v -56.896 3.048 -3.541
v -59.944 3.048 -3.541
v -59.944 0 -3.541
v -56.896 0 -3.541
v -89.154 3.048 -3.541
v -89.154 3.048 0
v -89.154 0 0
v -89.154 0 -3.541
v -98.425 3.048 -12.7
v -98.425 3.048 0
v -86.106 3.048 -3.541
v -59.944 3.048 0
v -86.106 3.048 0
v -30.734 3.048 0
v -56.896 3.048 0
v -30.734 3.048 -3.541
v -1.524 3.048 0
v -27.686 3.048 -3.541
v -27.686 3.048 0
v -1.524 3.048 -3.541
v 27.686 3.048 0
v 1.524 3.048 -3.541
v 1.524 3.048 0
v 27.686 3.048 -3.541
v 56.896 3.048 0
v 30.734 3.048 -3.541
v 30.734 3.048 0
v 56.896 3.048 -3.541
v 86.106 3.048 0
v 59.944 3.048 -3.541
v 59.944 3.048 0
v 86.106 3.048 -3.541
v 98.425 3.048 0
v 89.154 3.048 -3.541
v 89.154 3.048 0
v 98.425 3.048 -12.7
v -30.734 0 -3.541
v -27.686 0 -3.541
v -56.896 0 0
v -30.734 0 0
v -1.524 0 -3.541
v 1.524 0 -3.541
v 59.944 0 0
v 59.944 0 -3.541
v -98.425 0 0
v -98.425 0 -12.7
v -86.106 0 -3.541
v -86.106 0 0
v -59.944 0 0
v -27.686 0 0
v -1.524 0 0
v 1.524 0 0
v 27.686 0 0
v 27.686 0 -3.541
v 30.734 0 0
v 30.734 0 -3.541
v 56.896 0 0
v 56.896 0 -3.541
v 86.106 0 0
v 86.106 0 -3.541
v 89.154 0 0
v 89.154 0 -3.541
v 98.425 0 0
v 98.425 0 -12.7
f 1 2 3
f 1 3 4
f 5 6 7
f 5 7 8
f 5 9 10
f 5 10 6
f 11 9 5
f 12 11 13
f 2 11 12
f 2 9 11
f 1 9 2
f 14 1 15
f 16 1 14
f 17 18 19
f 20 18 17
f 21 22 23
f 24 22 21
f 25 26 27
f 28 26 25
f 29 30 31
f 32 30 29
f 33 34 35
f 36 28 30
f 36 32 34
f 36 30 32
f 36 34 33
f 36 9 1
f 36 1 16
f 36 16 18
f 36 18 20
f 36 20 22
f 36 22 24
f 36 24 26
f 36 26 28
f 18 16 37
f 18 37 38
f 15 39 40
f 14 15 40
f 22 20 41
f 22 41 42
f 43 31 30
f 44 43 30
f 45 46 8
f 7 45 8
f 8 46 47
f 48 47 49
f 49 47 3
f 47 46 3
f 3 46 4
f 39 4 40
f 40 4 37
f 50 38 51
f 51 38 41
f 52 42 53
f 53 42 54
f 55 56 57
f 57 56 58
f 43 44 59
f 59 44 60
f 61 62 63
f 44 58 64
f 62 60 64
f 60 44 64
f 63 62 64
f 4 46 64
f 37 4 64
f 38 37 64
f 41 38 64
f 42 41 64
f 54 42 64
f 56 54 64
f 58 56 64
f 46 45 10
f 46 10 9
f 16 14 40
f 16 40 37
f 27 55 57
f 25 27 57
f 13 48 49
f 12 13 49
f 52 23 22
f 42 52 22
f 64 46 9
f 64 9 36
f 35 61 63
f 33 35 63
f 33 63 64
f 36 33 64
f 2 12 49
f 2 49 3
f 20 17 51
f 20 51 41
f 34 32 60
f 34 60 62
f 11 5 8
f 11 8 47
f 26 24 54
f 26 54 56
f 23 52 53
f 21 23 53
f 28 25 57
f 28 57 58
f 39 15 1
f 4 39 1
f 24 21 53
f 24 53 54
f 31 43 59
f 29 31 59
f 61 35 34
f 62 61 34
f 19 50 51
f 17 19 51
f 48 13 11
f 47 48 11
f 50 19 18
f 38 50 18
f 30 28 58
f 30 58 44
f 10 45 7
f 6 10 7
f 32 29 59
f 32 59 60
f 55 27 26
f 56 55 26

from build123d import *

# Parameters (mm, degrees)
SKETCH1_W           = 196.85
SKETCH1_H           = 12.7
BOSS_EXTRUDE1_DEPTH = 3.048
SKETCH2_W           = 3.048
SKETCH2_H           = 3.541160525
CUT_EXTRUDE1_DEPTH  = 4.048


with BuildPart() as part:
    # Sketch1 → Boss-Extrude1 (new body)
    with BuildSketch(Plane(origin=(0, 0, 0), x_dir=(1, 0, 0), z_dir=(0, 1, 0))):
        with Locations((0, 6.35)):
            Rectangle(SKETCH1_W, SKETCH1_H)
    extrude(amount=BOSS_EXTRUDE1_DEPTH)

    # Sketch2 → Cut-Extrude1 (cut, through all)
    with BuildSketch(Plane(origin=(0, 3.048, 0), x_dir=(1, 0, 0), z_dir=(0, 1, 0))):
        with Locations((87.63, 1.770580263)):
            Rectangle(SKETCH2_W, SKETCH2_H)
        with Locations((58.42, 1.770580263)):
            Rectangle(SKETCH2_W, SKETCH2_H)
        with Locations((29.21, 1.770580263)):
            Rectangle(SKETCH2_W, SKETCH2_H)
        with Locations((0, 1.770580263)):
            Rectangle(SKETCH2_W, SKETCH2_H)
        with Locations((-29.21, 1.770580263)):
            Rectangle(SKETCH2_W, SKETCH2_H)
        with Locations((-58.42, 1.770580263)):
            Rectangle(SKETCH2_W, SKETCH2_H)
        with Locations((-87.63, 1.770580263)):
            Rectangle(SKETCH2_W, SKETCH2_H)
    extrude(amount=-CUT_EXTRUDE1_DEPTH, mode=Mode.SUBTRACT)


solid = part.part
